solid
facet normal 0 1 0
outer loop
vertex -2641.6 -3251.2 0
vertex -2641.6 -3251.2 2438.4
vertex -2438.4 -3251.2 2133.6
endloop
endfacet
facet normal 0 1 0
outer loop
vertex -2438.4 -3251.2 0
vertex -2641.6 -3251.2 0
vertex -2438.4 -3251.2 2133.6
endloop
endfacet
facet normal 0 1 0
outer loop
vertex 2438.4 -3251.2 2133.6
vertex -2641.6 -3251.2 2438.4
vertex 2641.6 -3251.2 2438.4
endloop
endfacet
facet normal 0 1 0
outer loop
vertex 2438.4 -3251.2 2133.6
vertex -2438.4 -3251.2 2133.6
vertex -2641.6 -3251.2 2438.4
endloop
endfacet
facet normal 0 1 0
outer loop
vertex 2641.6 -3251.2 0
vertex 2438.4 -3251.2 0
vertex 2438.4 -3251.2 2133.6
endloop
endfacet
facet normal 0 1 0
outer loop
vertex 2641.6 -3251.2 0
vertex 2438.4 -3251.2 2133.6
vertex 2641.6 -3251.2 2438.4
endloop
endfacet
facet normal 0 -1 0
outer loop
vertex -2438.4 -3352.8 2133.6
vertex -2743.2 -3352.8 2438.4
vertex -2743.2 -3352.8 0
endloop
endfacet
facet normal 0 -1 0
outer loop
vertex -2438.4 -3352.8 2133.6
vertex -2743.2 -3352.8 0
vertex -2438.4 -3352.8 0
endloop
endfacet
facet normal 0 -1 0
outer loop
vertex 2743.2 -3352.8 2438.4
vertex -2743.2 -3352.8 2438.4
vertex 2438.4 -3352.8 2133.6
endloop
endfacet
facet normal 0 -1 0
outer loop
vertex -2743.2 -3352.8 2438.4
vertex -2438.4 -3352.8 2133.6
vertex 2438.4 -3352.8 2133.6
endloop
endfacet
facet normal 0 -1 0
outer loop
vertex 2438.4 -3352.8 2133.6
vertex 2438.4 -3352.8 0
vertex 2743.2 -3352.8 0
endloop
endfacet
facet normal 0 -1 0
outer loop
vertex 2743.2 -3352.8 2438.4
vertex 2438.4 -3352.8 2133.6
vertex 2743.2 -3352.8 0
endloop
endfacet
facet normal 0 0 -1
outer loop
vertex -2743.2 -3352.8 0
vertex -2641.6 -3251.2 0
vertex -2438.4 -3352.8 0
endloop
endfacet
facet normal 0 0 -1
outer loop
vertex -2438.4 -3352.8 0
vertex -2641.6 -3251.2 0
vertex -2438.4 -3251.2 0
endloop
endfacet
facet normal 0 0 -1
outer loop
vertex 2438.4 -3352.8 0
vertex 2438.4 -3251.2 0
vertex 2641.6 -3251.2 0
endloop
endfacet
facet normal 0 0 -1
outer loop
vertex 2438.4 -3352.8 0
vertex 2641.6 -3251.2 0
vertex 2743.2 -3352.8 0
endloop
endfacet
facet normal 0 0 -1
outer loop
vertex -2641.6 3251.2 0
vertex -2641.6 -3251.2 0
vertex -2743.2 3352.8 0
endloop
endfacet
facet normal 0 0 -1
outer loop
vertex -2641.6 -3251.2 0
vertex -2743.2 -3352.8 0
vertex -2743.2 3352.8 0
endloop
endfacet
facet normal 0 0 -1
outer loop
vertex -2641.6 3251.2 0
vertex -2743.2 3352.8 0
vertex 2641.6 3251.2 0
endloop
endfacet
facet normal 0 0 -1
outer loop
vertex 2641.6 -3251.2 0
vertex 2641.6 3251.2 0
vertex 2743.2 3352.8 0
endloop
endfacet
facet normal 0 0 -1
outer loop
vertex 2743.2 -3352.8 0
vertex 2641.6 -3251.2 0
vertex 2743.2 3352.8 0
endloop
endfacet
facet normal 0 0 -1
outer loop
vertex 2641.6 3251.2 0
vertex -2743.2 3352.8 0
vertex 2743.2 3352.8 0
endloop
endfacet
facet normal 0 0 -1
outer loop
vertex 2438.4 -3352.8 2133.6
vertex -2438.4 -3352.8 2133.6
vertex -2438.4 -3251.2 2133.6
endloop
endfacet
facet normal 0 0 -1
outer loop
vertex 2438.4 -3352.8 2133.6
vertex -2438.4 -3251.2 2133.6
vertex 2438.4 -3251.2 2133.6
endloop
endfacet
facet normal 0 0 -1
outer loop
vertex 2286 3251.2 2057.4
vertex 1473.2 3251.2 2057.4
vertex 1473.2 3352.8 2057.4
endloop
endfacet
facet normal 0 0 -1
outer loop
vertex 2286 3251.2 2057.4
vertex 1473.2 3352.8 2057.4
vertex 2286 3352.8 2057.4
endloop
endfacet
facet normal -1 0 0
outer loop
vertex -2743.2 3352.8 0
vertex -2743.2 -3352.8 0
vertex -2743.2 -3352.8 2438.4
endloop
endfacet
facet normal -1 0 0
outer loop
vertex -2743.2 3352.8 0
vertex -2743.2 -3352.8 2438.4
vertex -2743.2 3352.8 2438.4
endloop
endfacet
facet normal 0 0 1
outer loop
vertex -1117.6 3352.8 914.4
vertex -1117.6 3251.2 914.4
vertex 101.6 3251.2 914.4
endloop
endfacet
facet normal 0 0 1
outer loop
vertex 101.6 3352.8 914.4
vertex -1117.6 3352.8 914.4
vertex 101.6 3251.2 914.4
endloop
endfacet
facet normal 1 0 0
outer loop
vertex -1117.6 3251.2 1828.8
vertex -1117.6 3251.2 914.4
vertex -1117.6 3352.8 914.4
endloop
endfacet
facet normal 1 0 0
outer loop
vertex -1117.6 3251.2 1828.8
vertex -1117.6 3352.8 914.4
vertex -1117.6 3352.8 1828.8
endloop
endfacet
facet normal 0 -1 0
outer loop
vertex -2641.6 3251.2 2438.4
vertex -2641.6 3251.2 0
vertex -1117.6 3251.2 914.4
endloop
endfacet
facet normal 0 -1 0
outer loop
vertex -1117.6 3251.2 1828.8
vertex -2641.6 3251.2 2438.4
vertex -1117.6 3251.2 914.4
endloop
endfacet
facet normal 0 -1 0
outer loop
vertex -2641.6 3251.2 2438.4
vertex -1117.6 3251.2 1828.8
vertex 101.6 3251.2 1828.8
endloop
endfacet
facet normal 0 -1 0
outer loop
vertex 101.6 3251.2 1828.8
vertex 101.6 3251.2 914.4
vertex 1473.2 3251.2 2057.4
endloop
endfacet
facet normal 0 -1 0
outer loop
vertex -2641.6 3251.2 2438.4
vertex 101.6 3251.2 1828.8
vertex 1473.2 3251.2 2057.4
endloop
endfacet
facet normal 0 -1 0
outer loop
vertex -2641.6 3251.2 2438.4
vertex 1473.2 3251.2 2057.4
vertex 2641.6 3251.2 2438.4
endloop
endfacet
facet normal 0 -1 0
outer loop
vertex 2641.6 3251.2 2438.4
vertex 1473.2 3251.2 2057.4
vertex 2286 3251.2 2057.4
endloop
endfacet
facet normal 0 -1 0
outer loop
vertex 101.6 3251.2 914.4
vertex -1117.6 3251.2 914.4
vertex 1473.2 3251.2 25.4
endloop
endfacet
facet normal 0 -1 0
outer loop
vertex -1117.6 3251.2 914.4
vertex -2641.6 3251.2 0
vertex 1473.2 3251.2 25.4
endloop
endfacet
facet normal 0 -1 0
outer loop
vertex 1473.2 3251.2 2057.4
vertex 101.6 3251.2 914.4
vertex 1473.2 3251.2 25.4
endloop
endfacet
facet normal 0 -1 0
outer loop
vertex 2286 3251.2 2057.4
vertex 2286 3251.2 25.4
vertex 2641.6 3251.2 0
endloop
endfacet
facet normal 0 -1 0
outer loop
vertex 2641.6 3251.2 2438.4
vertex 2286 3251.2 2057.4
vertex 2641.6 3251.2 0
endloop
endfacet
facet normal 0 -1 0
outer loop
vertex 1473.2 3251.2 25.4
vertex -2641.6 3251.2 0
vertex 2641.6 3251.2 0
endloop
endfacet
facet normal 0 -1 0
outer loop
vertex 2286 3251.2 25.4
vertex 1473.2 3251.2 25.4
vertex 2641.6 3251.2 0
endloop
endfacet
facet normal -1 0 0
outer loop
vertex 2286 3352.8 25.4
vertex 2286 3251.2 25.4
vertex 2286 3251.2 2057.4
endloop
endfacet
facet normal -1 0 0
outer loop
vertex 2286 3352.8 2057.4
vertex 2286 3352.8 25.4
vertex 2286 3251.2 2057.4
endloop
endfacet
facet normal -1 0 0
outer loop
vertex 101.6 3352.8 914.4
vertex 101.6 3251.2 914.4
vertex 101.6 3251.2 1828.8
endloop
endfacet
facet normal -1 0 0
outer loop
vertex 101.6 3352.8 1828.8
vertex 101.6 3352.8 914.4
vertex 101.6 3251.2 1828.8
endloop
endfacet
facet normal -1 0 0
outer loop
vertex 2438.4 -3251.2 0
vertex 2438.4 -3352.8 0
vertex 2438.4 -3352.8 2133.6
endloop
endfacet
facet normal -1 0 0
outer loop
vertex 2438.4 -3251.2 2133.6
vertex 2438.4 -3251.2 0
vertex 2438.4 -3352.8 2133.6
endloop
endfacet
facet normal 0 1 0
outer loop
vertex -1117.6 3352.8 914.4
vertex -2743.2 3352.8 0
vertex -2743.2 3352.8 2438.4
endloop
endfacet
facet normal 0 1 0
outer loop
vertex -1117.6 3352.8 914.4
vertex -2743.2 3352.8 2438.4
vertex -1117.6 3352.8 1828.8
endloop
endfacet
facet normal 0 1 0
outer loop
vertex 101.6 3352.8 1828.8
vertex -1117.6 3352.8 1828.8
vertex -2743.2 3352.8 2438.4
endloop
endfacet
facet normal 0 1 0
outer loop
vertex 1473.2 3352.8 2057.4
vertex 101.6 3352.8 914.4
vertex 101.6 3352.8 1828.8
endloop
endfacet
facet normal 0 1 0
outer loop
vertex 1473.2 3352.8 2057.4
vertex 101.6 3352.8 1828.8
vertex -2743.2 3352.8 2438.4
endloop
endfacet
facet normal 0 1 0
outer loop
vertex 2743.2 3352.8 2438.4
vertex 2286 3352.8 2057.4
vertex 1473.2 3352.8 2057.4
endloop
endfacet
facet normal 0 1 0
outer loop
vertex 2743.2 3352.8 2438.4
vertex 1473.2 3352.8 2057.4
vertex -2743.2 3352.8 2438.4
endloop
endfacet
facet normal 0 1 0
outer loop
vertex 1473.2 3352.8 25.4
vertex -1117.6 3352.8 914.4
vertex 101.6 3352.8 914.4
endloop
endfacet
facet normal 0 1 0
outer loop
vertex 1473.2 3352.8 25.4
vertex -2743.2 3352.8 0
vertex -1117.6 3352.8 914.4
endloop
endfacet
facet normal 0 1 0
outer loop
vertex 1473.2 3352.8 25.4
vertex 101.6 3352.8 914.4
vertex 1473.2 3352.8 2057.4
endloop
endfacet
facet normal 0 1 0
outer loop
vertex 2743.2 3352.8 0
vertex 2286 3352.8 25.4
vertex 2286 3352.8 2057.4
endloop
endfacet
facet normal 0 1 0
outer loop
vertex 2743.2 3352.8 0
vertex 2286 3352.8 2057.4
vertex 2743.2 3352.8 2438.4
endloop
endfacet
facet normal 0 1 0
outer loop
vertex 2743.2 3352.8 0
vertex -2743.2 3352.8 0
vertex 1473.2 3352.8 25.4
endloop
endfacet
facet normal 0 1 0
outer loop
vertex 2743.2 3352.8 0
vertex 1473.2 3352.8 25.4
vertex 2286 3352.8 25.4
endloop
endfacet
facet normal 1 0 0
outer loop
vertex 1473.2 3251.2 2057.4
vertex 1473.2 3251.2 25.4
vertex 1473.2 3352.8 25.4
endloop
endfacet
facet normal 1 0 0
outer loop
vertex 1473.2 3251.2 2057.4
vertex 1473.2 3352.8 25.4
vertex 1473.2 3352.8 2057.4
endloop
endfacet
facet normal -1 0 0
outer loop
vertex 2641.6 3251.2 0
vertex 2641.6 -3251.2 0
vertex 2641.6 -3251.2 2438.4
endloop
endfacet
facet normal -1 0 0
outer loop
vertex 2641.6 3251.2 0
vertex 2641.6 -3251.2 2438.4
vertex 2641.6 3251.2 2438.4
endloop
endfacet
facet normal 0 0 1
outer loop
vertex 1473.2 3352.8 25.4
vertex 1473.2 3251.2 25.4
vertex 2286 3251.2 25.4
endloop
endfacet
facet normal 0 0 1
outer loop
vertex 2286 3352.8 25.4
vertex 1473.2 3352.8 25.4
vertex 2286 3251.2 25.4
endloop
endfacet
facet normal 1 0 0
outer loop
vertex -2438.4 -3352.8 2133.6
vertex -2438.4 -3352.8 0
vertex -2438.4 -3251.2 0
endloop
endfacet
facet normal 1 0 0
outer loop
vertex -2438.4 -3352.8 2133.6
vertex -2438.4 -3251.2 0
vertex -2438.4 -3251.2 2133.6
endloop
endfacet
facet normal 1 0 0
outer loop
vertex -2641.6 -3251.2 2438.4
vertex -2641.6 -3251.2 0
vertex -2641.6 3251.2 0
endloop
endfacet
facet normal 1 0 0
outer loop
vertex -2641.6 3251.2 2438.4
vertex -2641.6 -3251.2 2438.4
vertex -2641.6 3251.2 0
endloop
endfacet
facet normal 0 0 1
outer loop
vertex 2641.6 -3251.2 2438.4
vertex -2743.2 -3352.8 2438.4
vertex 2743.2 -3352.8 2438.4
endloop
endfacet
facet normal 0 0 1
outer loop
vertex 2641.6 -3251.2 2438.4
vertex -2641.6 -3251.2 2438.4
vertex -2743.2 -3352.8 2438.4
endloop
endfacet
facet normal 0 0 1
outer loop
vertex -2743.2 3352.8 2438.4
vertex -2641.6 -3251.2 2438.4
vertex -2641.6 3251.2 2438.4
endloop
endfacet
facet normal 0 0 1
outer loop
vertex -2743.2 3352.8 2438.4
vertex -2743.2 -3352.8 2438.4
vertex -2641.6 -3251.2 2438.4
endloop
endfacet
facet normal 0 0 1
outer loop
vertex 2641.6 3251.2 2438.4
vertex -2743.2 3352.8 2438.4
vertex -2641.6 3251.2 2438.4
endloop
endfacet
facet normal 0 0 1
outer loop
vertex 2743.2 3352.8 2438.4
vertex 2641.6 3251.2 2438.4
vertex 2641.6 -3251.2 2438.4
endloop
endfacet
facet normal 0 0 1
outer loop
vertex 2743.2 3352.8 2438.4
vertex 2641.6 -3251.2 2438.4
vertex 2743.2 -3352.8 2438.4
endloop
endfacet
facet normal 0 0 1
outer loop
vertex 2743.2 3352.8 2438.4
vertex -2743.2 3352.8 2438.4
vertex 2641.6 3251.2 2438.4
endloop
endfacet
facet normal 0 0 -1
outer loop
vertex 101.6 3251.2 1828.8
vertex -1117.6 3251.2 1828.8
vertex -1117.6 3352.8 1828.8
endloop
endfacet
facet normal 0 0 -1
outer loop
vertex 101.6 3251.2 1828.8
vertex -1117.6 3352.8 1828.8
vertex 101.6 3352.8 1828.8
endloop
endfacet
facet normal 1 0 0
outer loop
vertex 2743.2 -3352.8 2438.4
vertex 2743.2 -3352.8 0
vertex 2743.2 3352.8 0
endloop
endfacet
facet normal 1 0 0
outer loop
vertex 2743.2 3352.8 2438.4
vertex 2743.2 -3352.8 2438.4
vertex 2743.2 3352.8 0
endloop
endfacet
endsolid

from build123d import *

# Parameters (mm, degrees)
F0_W     = 5486.4
F0_H     = 6705.6
F0_W_2   = 5283.2
F0_H_2   = 6502.4
F1_DEPTH = 2438.4
F2_W     = 1219.2
F2_H     = 914.4
F3_DEPTH = 101.6
F4_W     = 812.8
F4_H     = 2032
F5_DEPTH = 101.6
F6_W     = 4876.8
F6_H     = 2133.6
F7_DEPTH = 101.6


with BuildPart() as f1:
    # F0 (on Top) → F1 (new body)
    with BuildSketch(Plane.XY):
        Rectangle(F0_W, F0_H)
        Rectangle(F0_W_2, F0_H_2, mode=Mode.SUBTRACT)
    extrude(amount=F1_DEPTH)

    # F2 (on face) → F3 (cut, through all)
    with BuildSketch(Plane.XZ.offset(-3251.2)):
        with Locations((-508, 1371.6)):
            Rectangle(F2_W, F2_H)
    extrude(amount=-F3_DEPTH, mode=Mode.SUBTRACT)

    # F4 (on face) → F5 (cut, through all)
    with BuildSketch(Plane.XZ.offset(-3251.2)):
        with Locations((1879.6, 1041.4)):
            Rectangle(F4_W, F4_H)
    extrude(amount=-F5_DEPTH, mode=Mode.SUBTRACT)

    # F6 (on face) → F7 (cut, through all)
    with BuildSketch(Plane.XZ.offset(3352.8)):
        with Locations((0, 1066.8)):
            Rectangle(F6_W, F6_H)
    extrude(amount=-F7_DEPTH, mode=Mode.SUBTRACT)


solid = f1.part
